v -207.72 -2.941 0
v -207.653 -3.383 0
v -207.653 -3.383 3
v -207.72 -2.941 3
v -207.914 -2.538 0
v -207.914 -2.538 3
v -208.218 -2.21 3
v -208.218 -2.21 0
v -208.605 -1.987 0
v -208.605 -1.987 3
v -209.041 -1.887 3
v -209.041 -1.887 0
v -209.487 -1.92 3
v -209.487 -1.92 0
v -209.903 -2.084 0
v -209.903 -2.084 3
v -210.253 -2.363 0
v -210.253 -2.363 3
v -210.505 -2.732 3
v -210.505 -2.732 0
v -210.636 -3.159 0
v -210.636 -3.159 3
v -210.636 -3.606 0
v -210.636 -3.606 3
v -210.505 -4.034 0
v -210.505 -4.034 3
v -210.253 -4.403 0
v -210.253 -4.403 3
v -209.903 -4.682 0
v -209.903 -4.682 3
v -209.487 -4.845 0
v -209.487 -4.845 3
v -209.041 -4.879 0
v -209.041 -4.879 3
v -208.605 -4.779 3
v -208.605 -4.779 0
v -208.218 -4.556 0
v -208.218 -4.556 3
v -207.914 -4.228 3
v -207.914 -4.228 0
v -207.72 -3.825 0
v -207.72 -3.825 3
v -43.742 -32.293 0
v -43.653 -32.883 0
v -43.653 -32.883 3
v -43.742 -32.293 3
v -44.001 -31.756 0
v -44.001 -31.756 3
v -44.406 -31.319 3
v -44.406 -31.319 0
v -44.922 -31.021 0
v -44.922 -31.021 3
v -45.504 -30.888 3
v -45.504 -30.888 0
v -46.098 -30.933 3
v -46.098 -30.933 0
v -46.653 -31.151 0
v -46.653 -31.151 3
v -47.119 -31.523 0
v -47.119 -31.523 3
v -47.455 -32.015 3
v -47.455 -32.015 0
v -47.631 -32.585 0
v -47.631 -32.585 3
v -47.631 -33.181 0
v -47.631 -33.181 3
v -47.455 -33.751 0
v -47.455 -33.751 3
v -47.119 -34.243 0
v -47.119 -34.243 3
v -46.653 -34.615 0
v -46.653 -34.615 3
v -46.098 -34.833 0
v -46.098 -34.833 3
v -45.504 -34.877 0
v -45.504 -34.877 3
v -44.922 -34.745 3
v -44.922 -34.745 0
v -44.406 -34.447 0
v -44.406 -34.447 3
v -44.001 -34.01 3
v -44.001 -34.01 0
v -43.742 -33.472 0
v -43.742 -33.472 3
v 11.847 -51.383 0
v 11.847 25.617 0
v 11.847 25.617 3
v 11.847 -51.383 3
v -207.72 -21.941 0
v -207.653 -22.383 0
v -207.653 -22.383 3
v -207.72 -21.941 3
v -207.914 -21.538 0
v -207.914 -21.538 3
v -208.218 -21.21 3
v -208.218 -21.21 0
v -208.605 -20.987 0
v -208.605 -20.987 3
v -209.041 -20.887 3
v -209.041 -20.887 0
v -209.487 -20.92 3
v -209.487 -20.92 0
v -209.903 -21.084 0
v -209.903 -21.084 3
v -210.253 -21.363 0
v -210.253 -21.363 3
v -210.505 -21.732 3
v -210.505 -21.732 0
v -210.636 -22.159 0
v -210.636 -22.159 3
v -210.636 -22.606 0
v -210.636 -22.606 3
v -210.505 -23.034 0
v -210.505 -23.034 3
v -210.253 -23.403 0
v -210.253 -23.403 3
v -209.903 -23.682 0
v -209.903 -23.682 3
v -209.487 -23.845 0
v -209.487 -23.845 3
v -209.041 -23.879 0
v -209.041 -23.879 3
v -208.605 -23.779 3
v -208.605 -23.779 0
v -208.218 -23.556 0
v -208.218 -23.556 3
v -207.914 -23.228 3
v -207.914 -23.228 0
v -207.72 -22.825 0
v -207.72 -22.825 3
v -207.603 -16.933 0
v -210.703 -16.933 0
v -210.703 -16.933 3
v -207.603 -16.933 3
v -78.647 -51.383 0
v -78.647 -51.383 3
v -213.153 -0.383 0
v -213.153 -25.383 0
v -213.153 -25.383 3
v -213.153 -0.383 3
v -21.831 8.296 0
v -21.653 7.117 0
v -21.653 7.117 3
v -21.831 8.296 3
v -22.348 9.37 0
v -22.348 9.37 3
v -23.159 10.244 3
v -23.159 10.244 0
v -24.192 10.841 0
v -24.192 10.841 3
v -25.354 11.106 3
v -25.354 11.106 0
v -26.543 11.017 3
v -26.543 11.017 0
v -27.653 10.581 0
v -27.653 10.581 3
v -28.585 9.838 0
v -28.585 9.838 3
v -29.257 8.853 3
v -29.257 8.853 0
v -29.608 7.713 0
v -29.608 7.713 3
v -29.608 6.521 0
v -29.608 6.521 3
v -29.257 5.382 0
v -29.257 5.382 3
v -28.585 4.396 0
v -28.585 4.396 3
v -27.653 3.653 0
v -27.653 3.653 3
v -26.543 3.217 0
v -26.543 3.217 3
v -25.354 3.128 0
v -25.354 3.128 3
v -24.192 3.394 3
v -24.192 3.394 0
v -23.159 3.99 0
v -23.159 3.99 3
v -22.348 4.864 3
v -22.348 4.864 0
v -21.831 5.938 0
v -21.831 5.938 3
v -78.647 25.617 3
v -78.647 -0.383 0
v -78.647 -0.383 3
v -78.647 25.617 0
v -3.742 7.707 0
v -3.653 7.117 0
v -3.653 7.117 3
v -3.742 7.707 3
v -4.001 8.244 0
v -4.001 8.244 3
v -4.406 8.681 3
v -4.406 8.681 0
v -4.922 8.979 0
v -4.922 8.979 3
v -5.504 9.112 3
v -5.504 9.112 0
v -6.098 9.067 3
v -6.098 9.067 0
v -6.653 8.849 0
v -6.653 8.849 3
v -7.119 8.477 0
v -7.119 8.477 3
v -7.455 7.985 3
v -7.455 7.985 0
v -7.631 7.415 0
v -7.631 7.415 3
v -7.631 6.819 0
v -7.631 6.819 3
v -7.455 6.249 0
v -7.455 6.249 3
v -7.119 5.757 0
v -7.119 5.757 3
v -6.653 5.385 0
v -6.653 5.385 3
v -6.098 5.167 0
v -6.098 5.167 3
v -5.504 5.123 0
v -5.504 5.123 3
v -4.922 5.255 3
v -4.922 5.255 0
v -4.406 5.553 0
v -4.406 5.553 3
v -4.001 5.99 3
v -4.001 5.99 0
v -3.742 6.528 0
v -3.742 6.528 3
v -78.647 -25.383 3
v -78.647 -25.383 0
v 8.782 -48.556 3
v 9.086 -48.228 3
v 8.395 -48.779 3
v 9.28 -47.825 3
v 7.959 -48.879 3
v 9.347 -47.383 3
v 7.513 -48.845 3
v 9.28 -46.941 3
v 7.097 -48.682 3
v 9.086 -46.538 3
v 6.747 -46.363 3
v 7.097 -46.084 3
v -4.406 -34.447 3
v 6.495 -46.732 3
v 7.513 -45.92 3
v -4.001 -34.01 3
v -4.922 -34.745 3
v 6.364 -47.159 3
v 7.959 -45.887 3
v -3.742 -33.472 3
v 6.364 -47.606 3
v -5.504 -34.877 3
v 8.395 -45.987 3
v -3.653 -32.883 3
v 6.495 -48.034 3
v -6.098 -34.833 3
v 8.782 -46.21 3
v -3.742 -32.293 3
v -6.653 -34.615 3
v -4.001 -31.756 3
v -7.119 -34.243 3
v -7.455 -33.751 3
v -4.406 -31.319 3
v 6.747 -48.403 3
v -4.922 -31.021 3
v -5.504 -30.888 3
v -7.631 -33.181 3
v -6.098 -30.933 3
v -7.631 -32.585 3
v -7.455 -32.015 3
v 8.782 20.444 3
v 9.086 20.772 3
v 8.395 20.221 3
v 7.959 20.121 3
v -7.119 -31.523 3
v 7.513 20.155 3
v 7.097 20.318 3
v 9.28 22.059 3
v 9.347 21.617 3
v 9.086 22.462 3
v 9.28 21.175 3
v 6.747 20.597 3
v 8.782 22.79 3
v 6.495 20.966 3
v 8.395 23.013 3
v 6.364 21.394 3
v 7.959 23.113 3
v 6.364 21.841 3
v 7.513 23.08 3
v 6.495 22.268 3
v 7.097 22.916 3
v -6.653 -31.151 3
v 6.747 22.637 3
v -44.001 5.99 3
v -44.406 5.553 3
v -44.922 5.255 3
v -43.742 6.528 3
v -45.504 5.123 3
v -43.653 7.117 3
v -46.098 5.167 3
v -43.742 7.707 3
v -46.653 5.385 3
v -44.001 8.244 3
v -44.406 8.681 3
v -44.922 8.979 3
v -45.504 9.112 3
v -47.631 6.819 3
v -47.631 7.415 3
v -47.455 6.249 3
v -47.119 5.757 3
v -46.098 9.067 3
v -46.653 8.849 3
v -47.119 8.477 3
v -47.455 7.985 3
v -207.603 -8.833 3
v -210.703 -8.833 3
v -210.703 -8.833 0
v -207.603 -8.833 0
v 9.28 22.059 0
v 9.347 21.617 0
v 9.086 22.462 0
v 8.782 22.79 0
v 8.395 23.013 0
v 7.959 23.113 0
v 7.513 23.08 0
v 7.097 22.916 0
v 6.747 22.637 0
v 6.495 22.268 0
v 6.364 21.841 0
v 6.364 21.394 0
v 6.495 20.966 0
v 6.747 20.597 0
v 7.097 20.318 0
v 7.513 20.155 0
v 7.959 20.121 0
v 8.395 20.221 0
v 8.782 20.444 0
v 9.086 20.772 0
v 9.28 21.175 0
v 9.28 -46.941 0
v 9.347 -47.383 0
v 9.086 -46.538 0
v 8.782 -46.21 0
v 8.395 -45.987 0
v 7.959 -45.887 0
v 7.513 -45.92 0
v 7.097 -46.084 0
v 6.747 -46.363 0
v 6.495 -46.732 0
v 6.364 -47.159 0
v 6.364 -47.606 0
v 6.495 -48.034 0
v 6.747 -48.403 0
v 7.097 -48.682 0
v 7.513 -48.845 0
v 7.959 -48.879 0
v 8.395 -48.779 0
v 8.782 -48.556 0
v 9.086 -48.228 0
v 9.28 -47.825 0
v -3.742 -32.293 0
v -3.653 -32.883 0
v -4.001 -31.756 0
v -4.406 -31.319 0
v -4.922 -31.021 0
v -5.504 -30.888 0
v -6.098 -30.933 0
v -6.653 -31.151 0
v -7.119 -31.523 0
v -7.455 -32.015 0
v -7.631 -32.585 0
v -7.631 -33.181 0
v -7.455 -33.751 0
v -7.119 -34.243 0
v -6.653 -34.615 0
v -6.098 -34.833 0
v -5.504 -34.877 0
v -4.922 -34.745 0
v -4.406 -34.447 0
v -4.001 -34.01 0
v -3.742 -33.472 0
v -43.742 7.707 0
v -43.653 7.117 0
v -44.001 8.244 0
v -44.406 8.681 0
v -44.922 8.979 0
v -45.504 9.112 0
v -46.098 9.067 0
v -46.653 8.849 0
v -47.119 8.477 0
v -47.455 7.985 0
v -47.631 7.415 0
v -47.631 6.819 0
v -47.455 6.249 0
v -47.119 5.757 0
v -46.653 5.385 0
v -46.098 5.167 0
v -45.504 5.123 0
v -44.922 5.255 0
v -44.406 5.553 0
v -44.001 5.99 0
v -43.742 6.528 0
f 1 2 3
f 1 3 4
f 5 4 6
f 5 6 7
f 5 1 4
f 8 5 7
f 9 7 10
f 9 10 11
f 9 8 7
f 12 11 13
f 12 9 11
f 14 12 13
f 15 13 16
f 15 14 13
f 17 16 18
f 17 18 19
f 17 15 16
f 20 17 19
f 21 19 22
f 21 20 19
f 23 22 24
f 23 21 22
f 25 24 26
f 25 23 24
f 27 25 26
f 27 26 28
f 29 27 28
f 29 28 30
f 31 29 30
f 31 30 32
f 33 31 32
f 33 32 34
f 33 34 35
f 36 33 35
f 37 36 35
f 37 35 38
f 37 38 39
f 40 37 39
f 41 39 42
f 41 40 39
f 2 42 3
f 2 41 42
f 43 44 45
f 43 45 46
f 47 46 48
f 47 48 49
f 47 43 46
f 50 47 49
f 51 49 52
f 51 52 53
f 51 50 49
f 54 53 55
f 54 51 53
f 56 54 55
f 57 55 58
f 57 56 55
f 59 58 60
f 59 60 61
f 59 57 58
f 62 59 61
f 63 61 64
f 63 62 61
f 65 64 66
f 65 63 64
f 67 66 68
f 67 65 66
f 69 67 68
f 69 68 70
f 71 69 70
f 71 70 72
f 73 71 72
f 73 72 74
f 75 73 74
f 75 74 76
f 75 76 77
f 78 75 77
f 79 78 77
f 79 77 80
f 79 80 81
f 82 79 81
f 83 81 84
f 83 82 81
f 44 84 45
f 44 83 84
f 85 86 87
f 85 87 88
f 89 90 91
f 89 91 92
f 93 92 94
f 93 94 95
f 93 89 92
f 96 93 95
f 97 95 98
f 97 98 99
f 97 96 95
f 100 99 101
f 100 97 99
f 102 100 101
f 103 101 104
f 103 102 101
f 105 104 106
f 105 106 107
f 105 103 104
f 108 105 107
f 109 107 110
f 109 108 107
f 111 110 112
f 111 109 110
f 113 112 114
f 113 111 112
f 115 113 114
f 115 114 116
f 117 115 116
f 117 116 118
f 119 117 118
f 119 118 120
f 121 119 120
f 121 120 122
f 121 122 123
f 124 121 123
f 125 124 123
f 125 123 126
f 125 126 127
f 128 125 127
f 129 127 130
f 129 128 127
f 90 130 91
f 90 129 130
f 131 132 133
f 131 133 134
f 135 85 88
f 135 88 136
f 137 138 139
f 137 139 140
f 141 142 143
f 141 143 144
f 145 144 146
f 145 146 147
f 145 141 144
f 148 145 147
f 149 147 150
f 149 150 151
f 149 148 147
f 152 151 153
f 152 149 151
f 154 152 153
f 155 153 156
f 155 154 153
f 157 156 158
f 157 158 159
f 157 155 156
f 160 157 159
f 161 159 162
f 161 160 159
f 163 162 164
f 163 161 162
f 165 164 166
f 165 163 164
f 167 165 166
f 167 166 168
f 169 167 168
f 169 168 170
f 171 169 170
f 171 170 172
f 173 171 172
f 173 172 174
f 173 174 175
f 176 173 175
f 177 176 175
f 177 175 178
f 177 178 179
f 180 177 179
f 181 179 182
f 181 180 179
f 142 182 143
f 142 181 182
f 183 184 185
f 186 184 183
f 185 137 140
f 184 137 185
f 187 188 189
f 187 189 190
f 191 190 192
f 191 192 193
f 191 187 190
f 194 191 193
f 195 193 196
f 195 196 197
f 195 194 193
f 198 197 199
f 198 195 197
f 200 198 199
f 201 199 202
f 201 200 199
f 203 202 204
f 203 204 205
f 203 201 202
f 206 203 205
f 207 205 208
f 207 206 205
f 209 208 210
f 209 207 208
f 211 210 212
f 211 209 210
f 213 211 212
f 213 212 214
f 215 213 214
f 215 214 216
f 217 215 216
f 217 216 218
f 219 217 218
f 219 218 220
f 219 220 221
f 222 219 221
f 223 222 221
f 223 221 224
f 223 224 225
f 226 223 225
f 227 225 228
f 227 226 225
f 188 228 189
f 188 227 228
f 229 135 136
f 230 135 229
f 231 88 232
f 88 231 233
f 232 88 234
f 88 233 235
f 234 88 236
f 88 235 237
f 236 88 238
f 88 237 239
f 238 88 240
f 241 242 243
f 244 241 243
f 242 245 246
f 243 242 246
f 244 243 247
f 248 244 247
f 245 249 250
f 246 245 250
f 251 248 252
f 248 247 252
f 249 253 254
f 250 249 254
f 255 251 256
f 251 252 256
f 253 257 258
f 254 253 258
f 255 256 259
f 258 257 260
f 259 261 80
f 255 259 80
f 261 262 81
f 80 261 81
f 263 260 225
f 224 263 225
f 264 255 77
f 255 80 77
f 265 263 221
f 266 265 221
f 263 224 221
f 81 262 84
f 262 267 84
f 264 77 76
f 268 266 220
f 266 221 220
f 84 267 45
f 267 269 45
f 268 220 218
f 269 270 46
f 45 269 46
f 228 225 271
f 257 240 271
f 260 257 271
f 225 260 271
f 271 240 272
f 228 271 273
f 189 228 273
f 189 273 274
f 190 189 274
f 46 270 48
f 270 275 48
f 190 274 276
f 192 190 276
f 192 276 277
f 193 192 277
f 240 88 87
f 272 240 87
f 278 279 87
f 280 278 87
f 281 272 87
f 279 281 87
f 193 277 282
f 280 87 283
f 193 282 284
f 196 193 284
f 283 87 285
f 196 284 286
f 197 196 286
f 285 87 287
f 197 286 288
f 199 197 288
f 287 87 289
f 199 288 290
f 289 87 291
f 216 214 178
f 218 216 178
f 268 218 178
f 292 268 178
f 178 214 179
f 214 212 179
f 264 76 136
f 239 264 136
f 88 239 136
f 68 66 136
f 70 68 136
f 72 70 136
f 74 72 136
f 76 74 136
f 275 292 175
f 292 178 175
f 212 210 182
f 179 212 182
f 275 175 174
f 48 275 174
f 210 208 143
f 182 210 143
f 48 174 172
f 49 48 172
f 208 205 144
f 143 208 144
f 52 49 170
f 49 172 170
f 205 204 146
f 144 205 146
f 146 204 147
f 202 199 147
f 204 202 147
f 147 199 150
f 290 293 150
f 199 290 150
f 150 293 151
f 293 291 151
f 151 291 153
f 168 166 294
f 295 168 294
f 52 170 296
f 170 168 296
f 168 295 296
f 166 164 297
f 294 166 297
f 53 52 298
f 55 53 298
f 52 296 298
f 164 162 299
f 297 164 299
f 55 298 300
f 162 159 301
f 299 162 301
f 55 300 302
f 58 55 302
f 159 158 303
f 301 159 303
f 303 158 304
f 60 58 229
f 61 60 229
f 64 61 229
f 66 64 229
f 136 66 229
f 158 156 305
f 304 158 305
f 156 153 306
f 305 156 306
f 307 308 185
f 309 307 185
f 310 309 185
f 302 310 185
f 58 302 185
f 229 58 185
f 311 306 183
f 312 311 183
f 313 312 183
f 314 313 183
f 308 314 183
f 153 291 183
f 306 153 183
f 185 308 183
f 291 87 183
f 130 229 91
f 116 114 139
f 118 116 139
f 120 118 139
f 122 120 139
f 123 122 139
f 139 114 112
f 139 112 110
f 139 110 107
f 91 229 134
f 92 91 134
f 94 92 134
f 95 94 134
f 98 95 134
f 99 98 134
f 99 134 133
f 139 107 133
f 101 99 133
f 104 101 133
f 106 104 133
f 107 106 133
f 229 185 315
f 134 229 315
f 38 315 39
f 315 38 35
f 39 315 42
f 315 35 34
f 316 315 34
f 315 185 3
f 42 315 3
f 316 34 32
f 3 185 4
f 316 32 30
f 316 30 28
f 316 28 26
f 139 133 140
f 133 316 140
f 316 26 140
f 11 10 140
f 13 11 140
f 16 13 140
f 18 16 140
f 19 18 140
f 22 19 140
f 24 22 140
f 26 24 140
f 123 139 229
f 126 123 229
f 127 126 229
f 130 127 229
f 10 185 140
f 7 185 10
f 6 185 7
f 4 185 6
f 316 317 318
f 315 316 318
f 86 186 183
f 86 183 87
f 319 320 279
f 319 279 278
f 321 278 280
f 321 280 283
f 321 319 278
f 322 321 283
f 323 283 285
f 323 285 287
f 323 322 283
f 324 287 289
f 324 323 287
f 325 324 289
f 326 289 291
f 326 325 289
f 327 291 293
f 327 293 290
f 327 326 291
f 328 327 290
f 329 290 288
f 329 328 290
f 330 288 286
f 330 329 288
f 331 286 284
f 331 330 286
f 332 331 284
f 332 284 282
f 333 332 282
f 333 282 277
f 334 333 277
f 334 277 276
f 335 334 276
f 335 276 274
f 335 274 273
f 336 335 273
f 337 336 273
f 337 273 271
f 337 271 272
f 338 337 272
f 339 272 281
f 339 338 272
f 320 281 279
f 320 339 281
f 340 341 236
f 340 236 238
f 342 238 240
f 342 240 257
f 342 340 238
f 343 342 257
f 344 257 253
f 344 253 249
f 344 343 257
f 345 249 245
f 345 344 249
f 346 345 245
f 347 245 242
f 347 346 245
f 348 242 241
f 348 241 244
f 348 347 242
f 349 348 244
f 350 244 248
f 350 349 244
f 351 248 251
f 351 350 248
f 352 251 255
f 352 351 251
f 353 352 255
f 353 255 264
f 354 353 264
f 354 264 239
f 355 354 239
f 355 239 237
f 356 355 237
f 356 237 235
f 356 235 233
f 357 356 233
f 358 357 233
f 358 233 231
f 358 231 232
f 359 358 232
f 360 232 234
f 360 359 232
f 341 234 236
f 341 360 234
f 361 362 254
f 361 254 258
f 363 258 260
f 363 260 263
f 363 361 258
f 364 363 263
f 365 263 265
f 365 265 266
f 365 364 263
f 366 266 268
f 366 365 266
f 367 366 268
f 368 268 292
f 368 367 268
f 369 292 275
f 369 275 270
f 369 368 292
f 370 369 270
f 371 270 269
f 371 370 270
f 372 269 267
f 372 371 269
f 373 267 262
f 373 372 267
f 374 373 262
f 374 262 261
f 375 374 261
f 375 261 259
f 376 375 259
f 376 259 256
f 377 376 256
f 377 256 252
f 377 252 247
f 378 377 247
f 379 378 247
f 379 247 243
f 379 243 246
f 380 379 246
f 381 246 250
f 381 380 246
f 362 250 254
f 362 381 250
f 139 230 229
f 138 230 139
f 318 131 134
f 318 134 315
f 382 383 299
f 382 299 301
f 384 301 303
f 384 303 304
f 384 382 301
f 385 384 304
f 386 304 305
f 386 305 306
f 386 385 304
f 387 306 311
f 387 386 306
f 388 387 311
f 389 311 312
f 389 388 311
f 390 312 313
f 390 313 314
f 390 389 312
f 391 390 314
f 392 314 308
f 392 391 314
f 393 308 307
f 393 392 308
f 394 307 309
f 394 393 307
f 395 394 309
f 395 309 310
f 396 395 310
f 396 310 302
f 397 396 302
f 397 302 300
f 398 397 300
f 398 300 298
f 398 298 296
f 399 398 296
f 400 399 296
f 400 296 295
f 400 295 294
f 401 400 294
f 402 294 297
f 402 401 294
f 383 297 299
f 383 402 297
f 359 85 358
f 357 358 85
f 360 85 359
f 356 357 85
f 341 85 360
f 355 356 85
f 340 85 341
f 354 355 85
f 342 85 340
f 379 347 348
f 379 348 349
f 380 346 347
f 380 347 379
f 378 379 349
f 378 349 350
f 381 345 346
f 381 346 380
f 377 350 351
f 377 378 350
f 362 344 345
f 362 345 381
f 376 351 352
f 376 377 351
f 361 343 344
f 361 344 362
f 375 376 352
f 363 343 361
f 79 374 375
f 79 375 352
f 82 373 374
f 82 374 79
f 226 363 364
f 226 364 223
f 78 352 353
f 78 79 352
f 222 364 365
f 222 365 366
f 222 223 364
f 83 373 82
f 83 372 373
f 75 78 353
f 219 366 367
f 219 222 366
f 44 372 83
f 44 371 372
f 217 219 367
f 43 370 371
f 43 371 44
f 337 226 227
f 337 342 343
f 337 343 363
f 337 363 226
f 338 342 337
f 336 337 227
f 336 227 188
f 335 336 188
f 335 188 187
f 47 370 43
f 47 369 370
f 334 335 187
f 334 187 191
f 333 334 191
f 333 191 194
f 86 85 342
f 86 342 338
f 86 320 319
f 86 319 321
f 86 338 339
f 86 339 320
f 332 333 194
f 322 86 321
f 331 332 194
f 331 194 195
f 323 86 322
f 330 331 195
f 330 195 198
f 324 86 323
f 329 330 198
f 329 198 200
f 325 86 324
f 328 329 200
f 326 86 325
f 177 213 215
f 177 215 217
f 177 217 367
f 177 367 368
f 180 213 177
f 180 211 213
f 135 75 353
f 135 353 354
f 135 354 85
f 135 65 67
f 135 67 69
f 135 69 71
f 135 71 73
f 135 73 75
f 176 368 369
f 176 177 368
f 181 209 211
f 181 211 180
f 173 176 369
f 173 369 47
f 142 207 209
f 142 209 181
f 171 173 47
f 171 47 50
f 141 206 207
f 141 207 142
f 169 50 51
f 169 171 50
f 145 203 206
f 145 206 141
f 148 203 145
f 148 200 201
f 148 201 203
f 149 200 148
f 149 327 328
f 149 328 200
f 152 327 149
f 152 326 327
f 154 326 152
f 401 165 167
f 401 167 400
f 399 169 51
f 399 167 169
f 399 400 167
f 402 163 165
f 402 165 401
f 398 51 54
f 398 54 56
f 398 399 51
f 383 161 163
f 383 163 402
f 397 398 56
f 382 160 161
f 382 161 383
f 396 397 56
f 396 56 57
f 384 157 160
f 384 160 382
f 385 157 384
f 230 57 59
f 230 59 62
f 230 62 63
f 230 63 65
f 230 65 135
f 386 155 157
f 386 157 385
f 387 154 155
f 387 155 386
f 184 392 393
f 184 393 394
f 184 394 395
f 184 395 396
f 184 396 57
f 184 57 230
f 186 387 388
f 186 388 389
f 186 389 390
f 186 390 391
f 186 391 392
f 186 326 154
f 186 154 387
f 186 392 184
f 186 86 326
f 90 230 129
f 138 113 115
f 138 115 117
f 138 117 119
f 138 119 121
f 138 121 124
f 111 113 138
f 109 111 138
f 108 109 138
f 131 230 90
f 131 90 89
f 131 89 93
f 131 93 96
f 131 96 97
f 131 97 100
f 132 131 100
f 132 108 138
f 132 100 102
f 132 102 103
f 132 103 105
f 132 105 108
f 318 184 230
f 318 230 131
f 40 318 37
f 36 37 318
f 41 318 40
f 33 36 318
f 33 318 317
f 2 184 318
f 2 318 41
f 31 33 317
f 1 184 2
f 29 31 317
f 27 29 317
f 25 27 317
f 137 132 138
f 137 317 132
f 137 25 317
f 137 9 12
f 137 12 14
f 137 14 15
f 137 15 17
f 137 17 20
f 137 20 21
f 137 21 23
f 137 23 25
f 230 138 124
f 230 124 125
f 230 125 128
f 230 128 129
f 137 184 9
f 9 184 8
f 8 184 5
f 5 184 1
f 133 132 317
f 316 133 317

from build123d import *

# Parameters (mm, degrees)
SKETCH_1_R      = 1.5
SKETCH_1_R_2    = 2
SKETCH_1_R_3    = 4
SKETCH_1_W      = 3.1
SKETCH_1_H      = 8.1
EXTRUDE_1_DEPTH = 3


with BuildPart() as part:
    # 草图1 → 凸台-拉伸1 (new body)
    with BuildSketch(Plane.XY):
        Polygon((11.846846847, 25.617117117), (11.846846847, -51.382882883), (-78.647317431, -51.382882883), (-78.647317431, -25.382882883), (-213.153153153, -25.382882883), (-213.153153153, -0.382882883), (-78.647317431, -0.382882883), (-78.647317431, 25.617117117), align=None)
        with Locations((-209.153153153, -3.382882883)):
            Circle(SKETCH_1_R, mode=Mode.SUBTRACT)
        with Locations((7.846846847, 21.617117117)):
            Circle(SKETCH_1_R, mode=Mode.SUBTRACT)
        with Locations((-209.153153153, -22.382882883)):
            Circle(SKETCH_1_R, mode=Mode.SUBTRACT)
        with Locations((7.846846847, -47.382882883)):
            Circle(SKETCH_1_R, mode=Mode.SUBTRACT)
        with Locations((-5.653153153, -32.882882883)):
            Circle(SKETCH_1_R_2, mode=Mode.SUBTRACT)
        with Locations((-45.653153153, -32.882882883)):
            Circle(SKETCH_1_R_2, mode=Mode.SUBTRACT)
        with Locations((-45.653153153, 7.117117117)):
            Circle(SKETCH_1_R_2, mode=Mode.SUBTRACT)
        with Locations((-5.653153153, 7.117117117)):
            Circle(SKETCH_1_R_2, mode=Mode.SUBTRACT)
        with Locations((-25.653153153, 7.117117117)):
            Circle(SKETCH_1_R_3, mode=Mode.SUBTRACT)
        with Locations((-209.153153153, -12.882882883)):
            Rectangle(SKETCH_1_W, SKETCH_1_H, mode=Mode.SUBTRACT)
    extrude(amount=EXTRUDE_1_DEPTH)


solid = part.part
